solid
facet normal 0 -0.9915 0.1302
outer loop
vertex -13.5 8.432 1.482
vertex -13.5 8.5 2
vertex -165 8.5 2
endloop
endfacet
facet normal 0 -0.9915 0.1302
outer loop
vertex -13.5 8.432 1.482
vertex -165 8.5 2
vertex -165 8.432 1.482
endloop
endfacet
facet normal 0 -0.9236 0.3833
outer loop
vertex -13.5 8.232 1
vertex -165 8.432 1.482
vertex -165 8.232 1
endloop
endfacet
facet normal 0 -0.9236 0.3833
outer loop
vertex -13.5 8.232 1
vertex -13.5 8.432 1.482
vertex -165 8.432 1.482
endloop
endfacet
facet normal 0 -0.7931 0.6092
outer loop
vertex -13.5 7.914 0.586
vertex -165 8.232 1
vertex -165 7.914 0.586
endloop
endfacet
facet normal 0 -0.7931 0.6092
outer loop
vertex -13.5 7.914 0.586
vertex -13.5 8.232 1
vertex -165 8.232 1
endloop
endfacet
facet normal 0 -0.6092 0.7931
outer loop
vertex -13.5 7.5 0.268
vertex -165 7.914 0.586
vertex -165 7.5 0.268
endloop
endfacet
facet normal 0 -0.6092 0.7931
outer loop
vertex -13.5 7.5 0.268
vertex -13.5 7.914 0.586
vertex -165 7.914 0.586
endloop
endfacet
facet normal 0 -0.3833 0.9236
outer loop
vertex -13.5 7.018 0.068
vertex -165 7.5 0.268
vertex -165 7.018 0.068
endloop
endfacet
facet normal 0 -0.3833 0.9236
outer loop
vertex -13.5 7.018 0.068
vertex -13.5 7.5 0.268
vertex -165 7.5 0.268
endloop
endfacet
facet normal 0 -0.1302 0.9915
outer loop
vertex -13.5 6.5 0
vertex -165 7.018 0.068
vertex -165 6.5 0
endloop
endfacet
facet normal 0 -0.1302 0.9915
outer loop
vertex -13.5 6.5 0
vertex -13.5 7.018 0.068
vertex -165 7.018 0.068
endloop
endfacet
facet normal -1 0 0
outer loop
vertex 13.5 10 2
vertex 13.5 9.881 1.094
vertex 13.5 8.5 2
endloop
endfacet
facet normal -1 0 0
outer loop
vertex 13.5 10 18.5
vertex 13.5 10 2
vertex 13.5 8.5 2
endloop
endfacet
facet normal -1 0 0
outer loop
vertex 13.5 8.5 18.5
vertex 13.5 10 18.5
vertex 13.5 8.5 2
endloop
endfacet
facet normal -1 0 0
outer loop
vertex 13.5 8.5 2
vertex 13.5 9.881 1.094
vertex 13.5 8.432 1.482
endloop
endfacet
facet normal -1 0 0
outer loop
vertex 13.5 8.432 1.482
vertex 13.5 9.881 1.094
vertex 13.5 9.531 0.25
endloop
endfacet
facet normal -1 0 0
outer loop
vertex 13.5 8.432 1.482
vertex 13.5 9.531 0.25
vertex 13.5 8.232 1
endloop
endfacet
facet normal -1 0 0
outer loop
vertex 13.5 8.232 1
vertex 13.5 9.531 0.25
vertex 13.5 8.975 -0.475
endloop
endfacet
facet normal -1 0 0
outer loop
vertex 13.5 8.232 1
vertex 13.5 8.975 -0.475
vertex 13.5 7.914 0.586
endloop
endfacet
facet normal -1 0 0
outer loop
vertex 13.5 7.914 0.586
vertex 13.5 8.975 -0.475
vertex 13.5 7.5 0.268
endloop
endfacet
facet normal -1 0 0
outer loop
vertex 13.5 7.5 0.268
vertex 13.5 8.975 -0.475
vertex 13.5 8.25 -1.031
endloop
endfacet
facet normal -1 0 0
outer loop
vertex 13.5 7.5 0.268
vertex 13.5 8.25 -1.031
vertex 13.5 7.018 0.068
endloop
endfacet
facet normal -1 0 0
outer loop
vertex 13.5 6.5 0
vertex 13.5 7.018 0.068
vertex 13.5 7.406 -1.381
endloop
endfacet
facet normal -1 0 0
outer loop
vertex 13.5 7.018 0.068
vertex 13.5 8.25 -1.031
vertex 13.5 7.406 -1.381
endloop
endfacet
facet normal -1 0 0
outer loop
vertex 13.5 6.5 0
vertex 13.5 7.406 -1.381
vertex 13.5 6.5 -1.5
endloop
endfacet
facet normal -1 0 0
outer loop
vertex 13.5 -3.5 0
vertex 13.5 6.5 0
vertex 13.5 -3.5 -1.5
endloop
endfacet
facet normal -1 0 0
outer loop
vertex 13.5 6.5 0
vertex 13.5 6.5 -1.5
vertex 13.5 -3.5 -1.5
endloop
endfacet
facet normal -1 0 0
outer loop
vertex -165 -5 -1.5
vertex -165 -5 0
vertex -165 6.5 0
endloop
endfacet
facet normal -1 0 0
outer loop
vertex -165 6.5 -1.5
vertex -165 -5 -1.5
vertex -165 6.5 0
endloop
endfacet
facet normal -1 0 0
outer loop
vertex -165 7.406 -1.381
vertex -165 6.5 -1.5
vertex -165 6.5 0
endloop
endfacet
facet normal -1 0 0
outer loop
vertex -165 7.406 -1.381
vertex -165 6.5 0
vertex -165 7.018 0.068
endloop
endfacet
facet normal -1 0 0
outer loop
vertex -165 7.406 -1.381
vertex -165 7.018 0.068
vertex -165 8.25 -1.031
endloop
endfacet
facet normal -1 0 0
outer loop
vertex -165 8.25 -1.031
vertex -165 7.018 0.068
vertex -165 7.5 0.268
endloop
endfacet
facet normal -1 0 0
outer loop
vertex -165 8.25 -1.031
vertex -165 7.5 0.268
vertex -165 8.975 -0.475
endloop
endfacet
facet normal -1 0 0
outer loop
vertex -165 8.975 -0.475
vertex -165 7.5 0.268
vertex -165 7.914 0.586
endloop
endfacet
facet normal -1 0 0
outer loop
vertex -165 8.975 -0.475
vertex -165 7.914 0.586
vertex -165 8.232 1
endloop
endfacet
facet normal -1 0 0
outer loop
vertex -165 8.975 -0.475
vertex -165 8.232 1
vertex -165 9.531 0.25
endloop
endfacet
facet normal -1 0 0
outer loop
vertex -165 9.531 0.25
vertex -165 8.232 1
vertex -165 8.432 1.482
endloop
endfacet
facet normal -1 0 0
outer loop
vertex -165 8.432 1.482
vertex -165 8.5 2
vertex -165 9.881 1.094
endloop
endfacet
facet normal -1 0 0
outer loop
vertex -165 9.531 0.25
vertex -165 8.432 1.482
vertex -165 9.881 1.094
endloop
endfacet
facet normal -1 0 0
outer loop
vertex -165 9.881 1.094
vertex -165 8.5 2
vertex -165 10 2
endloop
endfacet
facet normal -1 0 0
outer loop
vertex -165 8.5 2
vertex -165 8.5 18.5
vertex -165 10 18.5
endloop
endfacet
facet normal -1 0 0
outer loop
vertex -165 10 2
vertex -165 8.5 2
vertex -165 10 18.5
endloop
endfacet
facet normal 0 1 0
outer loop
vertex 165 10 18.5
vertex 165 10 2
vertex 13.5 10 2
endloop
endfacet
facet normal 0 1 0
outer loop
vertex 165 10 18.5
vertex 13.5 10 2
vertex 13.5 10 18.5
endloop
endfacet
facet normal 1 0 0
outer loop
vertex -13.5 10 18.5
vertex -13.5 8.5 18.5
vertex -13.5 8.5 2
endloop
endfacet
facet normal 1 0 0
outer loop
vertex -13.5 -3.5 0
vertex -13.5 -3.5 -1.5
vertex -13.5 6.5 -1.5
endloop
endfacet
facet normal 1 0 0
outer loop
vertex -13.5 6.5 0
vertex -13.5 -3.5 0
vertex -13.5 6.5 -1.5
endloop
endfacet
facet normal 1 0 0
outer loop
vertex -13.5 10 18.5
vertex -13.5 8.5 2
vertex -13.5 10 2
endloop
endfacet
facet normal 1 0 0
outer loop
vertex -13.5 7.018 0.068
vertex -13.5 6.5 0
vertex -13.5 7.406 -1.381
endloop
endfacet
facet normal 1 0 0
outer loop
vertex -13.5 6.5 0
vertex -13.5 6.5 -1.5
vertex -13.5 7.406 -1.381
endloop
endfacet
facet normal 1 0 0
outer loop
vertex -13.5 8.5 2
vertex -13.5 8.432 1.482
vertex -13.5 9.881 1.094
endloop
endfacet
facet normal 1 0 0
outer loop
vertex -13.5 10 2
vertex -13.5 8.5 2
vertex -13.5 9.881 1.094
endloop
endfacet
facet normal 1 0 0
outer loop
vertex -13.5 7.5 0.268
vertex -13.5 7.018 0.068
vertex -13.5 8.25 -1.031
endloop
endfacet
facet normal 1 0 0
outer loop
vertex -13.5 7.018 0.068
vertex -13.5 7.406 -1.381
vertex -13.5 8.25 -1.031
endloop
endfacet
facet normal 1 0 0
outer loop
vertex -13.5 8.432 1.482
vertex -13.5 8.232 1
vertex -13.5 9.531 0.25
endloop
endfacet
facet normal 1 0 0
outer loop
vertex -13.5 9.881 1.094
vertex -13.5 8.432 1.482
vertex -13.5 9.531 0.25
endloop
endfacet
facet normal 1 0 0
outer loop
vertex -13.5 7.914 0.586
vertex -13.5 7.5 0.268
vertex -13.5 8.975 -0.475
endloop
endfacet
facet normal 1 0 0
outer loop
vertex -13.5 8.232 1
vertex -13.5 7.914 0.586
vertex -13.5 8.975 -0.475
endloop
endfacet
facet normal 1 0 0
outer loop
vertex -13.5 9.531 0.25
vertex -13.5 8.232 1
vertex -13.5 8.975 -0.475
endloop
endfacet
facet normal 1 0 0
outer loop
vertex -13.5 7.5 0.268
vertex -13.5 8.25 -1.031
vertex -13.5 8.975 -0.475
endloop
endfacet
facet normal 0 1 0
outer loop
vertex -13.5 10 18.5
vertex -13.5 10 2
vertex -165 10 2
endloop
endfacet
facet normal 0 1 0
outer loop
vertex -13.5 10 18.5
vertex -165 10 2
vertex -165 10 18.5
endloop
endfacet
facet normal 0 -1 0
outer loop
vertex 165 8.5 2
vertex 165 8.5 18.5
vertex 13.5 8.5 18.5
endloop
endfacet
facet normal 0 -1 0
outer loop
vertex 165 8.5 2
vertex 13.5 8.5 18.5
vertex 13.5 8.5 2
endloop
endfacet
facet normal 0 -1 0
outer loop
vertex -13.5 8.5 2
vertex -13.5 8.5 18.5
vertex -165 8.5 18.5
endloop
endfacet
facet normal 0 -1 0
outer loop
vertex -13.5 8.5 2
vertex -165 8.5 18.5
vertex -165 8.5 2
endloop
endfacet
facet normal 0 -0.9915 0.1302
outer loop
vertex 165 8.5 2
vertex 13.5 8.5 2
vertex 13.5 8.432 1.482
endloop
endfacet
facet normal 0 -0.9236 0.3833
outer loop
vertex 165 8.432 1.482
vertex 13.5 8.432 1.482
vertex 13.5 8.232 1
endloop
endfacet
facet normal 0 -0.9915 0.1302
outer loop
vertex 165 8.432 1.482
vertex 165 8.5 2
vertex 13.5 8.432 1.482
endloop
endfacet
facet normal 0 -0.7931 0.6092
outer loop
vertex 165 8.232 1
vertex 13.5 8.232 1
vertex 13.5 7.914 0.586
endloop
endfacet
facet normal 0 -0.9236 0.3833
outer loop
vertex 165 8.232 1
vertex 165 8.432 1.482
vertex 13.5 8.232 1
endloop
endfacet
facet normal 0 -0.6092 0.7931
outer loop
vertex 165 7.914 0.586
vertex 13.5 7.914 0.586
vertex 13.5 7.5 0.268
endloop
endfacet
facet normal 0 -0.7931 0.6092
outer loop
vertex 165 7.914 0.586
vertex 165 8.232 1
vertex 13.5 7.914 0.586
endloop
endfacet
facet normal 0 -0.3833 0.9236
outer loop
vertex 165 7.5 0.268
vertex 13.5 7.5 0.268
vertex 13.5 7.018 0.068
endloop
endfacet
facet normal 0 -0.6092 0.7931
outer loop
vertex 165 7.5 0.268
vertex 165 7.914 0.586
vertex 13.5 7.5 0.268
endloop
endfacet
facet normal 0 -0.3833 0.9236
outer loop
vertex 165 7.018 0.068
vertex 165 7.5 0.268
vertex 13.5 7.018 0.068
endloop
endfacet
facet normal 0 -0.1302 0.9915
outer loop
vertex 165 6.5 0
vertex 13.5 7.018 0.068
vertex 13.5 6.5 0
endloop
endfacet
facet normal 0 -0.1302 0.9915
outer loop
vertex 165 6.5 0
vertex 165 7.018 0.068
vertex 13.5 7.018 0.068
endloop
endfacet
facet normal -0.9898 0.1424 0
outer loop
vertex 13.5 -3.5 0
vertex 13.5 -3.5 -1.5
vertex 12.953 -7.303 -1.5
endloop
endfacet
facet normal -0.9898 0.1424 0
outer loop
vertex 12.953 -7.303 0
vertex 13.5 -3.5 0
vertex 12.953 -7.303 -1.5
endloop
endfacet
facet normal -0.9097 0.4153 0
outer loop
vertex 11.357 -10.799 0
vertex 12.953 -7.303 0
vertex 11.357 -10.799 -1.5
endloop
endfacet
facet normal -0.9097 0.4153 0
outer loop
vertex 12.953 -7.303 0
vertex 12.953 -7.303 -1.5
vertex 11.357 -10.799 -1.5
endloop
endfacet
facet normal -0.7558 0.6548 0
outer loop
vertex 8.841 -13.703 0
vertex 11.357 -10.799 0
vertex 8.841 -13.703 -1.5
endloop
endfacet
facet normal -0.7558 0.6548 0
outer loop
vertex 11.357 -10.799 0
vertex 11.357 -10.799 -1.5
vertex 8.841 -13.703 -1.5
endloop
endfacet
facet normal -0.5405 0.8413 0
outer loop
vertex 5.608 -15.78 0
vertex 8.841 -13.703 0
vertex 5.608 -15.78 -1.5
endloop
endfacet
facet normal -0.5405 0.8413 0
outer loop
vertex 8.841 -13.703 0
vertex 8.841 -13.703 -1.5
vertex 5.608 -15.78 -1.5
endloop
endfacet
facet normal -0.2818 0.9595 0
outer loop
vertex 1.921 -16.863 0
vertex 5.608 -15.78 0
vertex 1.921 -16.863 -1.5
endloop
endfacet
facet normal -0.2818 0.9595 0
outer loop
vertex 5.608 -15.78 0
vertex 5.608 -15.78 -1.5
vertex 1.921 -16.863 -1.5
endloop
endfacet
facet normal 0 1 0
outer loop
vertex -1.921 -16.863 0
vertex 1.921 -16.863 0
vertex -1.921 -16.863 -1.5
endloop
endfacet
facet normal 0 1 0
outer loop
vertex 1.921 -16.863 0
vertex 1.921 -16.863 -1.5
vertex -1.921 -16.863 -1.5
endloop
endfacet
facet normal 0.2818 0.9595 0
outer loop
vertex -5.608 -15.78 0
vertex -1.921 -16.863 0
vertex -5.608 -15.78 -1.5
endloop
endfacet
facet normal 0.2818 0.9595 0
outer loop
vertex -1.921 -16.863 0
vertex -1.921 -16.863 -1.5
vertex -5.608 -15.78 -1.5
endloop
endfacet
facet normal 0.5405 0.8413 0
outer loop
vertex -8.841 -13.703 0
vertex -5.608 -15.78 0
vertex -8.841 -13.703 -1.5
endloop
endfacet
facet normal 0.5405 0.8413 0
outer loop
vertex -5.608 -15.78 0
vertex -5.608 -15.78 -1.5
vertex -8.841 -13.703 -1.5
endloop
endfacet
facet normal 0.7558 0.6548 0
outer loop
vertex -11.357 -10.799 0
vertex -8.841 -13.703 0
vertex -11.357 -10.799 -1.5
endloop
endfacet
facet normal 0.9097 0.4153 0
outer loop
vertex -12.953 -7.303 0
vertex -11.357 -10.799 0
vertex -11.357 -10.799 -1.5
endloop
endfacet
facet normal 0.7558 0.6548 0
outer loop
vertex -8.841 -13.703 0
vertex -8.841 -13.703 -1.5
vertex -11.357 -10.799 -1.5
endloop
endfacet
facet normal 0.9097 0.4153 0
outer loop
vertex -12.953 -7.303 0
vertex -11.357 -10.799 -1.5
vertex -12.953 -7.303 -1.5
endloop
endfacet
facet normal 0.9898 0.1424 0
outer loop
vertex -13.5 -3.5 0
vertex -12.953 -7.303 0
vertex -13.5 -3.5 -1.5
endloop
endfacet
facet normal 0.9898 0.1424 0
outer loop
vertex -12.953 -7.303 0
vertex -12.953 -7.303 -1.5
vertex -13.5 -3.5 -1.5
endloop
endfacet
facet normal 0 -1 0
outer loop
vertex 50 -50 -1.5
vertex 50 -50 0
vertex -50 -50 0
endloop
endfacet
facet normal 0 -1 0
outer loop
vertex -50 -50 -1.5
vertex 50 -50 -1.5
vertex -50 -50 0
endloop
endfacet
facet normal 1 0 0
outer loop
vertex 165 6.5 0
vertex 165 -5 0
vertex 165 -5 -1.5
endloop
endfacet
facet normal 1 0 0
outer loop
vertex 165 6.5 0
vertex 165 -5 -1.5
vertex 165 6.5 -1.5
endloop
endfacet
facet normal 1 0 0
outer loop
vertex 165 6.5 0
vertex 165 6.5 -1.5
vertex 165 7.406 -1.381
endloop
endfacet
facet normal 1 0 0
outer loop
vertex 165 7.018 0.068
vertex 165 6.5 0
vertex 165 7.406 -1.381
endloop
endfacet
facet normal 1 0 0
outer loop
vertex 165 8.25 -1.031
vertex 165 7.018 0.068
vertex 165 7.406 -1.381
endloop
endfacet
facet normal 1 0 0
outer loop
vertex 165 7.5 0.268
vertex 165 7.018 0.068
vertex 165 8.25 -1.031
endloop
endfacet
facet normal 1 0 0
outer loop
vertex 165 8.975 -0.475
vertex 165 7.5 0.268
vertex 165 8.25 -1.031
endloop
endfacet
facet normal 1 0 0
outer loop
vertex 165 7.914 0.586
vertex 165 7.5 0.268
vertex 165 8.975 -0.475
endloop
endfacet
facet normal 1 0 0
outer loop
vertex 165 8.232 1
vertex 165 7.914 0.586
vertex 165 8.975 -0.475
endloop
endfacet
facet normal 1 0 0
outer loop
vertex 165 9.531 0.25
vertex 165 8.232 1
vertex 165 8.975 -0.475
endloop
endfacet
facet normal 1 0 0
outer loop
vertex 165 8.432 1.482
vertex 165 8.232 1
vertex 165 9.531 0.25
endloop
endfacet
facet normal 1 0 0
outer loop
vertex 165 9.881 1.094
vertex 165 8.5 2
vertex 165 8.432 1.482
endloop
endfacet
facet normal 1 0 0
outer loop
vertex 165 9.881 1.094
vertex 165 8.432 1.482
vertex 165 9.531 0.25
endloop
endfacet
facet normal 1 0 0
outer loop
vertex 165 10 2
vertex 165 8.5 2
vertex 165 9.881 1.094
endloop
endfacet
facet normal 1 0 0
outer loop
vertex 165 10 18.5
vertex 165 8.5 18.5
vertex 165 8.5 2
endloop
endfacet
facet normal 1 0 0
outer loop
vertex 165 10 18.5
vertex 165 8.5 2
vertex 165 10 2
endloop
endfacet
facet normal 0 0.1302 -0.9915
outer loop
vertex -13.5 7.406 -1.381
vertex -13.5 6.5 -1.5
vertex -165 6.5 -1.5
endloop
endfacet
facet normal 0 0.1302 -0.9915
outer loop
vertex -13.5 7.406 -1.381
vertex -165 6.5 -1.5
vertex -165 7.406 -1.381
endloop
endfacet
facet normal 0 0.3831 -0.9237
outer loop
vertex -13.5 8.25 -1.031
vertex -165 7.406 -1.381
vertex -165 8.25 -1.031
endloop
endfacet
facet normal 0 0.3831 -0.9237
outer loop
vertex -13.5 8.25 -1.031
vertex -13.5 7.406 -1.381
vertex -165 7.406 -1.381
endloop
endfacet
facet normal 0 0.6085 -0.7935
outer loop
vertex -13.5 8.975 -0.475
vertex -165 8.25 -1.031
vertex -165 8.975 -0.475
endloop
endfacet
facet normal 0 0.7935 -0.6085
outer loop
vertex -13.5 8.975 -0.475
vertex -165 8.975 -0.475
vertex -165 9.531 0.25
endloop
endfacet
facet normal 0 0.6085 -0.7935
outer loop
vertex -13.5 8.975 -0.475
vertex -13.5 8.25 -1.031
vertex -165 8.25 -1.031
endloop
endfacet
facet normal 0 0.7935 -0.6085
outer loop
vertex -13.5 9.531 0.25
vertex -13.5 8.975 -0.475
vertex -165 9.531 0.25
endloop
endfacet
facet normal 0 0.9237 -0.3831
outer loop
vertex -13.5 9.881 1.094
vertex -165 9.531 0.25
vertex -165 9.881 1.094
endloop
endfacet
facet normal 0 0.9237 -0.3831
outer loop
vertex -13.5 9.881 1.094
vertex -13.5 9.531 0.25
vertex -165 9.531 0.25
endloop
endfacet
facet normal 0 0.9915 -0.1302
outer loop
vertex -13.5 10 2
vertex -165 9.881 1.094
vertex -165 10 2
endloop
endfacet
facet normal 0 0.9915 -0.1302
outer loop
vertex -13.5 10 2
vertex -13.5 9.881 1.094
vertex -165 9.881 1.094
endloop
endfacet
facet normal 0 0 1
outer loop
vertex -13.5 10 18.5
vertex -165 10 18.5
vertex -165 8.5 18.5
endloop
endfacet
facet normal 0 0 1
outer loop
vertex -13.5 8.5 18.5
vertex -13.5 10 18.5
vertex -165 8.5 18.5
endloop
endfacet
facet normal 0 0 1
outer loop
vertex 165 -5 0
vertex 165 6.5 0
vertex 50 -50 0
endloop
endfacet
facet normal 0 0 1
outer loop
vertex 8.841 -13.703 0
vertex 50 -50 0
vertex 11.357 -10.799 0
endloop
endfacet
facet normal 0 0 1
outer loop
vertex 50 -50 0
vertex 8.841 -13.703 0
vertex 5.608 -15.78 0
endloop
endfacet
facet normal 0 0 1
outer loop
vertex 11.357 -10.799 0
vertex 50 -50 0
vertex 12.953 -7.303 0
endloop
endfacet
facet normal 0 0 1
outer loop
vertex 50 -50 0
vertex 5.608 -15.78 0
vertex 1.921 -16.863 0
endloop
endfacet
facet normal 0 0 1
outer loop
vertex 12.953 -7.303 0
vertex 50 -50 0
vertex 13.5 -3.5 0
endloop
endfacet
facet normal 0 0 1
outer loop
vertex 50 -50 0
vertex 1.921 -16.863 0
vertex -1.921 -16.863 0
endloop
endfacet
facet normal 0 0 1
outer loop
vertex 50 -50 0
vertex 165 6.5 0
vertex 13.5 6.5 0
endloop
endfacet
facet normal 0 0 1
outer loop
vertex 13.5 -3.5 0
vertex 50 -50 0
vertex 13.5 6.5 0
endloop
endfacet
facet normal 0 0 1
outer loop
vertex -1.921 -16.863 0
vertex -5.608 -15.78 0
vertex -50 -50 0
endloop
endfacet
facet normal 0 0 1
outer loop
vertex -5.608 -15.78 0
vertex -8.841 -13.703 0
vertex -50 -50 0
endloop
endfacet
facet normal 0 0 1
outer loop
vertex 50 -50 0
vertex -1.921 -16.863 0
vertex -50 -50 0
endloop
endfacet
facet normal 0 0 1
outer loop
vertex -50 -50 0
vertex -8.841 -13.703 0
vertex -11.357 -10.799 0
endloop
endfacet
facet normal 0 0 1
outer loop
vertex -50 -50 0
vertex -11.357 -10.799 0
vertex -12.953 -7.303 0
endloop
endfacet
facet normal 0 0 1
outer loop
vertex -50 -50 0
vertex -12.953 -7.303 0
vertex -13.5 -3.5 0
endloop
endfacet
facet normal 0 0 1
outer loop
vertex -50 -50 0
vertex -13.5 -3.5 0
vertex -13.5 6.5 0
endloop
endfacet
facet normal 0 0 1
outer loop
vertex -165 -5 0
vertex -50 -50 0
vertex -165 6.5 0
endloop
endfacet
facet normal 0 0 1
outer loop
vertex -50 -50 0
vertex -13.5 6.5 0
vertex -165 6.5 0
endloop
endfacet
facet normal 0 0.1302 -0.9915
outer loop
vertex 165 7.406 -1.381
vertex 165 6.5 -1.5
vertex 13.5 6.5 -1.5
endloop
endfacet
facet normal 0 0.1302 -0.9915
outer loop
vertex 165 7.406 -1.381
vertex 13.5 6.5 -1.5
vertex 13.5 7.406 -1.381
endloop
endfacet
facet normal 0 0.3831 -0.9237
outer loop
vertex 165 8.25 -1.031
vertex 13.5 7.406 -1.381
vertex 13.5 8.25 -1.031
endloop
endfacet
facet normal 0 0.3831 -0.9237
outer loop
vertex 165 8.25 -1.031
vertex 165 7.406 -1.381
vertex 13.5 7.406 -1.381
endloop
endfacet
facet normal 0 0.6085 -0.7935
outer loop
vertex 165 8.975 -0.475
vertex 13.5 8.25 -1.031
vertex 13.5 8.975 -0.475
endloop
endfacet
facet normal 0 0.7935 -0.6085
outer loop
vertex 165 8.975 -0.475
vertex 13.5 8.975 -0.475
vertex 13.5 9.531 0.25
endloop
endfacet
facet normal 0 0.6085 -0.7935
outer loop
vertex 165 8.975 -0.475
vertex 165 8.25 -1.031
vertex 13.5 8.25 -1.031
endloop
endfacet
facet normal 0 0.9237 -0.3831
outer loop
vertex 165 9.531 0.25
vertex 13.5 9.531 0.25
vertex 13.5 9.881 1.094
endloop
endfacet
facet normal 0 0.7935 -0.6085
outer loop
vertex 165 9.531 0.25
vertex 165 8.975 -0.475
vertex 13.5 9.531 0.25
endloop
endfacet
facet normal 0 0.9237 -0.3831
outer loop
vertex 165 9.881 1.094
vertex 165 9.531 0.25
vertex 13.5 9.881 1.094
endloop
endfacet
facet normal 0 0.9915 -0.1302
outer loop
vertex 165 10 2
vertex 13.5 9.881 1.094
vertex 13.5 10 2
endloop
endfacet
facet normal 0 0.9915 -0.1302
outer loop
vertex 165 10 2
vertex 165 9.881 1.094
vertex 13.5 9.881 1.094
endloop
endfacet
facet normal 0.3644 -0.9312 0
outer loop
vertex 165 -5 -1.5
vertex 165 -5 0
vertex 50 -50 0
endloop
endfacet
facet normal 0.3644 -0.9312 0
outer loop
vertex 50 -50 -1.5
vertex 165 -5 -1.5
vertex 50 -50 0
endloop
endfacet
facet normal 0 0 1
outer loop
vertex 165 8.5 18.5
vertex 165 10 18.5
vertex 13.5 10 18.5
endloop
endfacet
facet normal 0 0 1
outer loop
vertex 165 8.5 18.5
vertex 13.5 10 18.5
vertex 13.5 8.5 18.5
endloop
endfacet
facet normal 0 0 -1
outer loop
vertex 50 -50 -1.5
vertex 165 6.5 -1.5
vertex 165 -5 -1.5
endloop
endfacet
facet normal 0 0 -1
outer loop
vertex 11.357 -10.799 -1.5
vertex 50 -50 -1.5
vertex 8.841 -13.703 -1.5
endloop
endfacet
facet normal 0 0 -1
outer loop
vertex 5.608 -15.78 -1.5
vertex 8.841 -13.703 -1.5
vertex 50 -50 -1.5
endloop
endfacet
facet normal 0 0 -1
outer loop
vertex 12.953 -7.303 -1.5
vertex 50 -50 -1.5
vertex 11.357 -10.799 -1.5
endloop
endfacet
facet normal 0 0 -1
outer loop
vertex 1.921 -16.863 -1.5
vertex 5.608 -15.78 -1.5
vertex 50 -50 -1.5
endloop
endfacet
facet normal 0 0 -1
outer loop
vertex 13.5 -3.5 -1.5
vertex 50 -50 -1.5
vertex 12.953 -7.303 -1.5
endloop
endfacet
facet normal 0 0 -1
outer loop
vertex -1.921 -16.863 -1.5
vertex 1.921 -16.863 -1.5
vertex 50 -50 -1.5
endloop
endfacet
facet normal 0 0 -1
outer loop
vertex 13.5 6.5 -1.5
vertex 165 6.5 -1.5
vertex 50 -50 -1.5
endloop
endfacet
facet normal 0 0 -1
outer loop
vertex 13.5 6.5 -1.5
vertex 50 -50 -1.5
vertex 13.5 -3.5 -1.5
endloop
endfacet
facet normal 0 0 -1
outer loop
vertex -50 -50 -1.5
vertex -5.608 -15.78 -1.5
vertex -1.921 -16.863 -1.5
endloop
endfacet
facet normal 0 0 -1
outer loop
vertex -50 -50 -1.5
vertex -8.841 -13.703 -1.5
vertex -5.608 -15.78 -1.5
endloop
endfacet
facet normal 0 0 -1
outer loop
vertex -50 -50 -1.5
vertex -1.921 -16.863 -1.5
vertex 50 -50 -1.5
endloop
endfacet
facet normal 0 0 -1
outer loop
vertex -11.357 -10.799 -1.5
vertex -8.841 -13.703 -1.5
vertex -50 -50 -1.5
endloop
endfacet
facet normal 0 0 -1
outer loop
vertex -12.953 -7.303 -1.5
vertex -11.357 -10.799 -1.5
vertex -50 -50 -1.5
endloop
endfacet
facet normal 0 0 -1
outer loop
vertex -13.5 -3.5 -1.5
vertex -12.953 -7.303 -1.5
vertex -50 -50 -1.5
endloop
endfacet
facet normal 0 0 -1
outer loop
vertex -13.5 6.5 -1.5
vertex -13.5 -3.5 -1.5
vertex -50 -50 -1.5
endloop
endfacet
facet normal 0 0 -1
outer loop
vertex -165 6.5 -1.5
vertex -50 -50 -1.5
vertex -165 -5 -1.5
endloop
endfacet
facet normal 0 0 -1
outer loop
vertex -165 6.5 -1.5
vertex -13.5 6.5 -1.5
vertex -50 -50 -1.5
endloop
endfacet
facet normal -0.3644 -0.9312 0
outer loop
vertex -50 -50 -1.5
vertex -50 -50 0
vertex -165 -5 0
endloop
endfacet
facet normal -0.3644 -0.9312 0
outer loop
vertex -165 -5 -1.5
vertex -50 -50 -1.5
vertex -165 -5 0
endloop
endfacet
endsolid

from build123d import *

# Parameters (mm, degrees)
BASE_FLANGE2_DEPTH           = 1.5
EDGE_FLANGE1_STRIP_W         = 10
EDGE_FLANGE1_STRIP_H         = 1.5
EDGE_FLANGE1_STRIP_CUT_DEPTH = 330
EDGE_FLANGE1_DEPTH           = 330
CUT_EXTRUDE1_DEPTH           = 174.399106111
CUT_EXTRUDE1_DEPTH_BACK      = 10


# Sheet-metal steps are written as plain solids
with BuildPart() as part:
    # Sketch1 → Base-Flange2 (new body)
    with BuildSketch(Plane.XY):
        Polygon((-165, 10), (165, 10), (165, -5), (50, -50), (-50, -50), (-165, -5), align=None)
    extrude(amount=-BASE_FLANGE2_DEPTH)

    # Edge-Flange1 strip (across the edge) → Edge-Flange1 strip cut (cut)
    with BuildSketch(Plane(origin=(165, 10, 0), x_dir=(0, -1, 0), z_dir=(-1, 0, 0))):
        with Locations((-1.5, -0.75)):
            Rectangle(EDGE_FLANGE1_STRIP_W, EDGE_FLANGE1_STRIP_H)
    extrude(amount=EDGE_FLANGE1_STRIP_CUT_DEPTH, mode=Mode.SUBTRACT)

    # Edge-Flange1 section (across the edge) → Edge-Flange1 (add)
    with BuildSketch(Plane(origin=(165, 10, 0), x_dir=(0, -1, 0), z_dir=(-1, 0, 0))):
        with BuildLine():
            Line((0, 2), (0, 18.5))
            Line((0, 18.5), (1.5, 18.5))
            Line((1.5, 18.5), (1.5, 2))
            ThreePointArc((1.5, 2), (2.085786438, 0.585786438), (3.5, 0))
            Line((3.5, 0), (3.5, -1.5))
            ThreePointArc((3.5, -1.5), (1.025126266, -0.474873734), (0, 2))
        make_face()
    extrude(amount=EDGE_FLANGE1_DEPTH)

    # Sketch13 → Cut-Extrude1 (cut, two sides: drawn at the far end of the back side and taken through both)
    with BuildSketch(Plane.XY.offset(-CUT_EXTRUDE1_DEPTH_BACK)):
        with BuildLine():
            Line((-13.5, -3.5), (-13.5, 21.0126417))
            Line((-13.5, 21.0126417), (13.5, 21.0126417))
            Line((13.5, 21.0126417), (13.5, -3.5))
            ThreePointArc((13.5, -3.5), (0, -17), (-13.5, -3.5))
        make_face()
    extrude(amount=CUT_EXTRUDE1_DEPTH + CUT_EXTRUDE1_DEPTH_BACK, mode=Mode.SUBTRACT)


solid = part.part
